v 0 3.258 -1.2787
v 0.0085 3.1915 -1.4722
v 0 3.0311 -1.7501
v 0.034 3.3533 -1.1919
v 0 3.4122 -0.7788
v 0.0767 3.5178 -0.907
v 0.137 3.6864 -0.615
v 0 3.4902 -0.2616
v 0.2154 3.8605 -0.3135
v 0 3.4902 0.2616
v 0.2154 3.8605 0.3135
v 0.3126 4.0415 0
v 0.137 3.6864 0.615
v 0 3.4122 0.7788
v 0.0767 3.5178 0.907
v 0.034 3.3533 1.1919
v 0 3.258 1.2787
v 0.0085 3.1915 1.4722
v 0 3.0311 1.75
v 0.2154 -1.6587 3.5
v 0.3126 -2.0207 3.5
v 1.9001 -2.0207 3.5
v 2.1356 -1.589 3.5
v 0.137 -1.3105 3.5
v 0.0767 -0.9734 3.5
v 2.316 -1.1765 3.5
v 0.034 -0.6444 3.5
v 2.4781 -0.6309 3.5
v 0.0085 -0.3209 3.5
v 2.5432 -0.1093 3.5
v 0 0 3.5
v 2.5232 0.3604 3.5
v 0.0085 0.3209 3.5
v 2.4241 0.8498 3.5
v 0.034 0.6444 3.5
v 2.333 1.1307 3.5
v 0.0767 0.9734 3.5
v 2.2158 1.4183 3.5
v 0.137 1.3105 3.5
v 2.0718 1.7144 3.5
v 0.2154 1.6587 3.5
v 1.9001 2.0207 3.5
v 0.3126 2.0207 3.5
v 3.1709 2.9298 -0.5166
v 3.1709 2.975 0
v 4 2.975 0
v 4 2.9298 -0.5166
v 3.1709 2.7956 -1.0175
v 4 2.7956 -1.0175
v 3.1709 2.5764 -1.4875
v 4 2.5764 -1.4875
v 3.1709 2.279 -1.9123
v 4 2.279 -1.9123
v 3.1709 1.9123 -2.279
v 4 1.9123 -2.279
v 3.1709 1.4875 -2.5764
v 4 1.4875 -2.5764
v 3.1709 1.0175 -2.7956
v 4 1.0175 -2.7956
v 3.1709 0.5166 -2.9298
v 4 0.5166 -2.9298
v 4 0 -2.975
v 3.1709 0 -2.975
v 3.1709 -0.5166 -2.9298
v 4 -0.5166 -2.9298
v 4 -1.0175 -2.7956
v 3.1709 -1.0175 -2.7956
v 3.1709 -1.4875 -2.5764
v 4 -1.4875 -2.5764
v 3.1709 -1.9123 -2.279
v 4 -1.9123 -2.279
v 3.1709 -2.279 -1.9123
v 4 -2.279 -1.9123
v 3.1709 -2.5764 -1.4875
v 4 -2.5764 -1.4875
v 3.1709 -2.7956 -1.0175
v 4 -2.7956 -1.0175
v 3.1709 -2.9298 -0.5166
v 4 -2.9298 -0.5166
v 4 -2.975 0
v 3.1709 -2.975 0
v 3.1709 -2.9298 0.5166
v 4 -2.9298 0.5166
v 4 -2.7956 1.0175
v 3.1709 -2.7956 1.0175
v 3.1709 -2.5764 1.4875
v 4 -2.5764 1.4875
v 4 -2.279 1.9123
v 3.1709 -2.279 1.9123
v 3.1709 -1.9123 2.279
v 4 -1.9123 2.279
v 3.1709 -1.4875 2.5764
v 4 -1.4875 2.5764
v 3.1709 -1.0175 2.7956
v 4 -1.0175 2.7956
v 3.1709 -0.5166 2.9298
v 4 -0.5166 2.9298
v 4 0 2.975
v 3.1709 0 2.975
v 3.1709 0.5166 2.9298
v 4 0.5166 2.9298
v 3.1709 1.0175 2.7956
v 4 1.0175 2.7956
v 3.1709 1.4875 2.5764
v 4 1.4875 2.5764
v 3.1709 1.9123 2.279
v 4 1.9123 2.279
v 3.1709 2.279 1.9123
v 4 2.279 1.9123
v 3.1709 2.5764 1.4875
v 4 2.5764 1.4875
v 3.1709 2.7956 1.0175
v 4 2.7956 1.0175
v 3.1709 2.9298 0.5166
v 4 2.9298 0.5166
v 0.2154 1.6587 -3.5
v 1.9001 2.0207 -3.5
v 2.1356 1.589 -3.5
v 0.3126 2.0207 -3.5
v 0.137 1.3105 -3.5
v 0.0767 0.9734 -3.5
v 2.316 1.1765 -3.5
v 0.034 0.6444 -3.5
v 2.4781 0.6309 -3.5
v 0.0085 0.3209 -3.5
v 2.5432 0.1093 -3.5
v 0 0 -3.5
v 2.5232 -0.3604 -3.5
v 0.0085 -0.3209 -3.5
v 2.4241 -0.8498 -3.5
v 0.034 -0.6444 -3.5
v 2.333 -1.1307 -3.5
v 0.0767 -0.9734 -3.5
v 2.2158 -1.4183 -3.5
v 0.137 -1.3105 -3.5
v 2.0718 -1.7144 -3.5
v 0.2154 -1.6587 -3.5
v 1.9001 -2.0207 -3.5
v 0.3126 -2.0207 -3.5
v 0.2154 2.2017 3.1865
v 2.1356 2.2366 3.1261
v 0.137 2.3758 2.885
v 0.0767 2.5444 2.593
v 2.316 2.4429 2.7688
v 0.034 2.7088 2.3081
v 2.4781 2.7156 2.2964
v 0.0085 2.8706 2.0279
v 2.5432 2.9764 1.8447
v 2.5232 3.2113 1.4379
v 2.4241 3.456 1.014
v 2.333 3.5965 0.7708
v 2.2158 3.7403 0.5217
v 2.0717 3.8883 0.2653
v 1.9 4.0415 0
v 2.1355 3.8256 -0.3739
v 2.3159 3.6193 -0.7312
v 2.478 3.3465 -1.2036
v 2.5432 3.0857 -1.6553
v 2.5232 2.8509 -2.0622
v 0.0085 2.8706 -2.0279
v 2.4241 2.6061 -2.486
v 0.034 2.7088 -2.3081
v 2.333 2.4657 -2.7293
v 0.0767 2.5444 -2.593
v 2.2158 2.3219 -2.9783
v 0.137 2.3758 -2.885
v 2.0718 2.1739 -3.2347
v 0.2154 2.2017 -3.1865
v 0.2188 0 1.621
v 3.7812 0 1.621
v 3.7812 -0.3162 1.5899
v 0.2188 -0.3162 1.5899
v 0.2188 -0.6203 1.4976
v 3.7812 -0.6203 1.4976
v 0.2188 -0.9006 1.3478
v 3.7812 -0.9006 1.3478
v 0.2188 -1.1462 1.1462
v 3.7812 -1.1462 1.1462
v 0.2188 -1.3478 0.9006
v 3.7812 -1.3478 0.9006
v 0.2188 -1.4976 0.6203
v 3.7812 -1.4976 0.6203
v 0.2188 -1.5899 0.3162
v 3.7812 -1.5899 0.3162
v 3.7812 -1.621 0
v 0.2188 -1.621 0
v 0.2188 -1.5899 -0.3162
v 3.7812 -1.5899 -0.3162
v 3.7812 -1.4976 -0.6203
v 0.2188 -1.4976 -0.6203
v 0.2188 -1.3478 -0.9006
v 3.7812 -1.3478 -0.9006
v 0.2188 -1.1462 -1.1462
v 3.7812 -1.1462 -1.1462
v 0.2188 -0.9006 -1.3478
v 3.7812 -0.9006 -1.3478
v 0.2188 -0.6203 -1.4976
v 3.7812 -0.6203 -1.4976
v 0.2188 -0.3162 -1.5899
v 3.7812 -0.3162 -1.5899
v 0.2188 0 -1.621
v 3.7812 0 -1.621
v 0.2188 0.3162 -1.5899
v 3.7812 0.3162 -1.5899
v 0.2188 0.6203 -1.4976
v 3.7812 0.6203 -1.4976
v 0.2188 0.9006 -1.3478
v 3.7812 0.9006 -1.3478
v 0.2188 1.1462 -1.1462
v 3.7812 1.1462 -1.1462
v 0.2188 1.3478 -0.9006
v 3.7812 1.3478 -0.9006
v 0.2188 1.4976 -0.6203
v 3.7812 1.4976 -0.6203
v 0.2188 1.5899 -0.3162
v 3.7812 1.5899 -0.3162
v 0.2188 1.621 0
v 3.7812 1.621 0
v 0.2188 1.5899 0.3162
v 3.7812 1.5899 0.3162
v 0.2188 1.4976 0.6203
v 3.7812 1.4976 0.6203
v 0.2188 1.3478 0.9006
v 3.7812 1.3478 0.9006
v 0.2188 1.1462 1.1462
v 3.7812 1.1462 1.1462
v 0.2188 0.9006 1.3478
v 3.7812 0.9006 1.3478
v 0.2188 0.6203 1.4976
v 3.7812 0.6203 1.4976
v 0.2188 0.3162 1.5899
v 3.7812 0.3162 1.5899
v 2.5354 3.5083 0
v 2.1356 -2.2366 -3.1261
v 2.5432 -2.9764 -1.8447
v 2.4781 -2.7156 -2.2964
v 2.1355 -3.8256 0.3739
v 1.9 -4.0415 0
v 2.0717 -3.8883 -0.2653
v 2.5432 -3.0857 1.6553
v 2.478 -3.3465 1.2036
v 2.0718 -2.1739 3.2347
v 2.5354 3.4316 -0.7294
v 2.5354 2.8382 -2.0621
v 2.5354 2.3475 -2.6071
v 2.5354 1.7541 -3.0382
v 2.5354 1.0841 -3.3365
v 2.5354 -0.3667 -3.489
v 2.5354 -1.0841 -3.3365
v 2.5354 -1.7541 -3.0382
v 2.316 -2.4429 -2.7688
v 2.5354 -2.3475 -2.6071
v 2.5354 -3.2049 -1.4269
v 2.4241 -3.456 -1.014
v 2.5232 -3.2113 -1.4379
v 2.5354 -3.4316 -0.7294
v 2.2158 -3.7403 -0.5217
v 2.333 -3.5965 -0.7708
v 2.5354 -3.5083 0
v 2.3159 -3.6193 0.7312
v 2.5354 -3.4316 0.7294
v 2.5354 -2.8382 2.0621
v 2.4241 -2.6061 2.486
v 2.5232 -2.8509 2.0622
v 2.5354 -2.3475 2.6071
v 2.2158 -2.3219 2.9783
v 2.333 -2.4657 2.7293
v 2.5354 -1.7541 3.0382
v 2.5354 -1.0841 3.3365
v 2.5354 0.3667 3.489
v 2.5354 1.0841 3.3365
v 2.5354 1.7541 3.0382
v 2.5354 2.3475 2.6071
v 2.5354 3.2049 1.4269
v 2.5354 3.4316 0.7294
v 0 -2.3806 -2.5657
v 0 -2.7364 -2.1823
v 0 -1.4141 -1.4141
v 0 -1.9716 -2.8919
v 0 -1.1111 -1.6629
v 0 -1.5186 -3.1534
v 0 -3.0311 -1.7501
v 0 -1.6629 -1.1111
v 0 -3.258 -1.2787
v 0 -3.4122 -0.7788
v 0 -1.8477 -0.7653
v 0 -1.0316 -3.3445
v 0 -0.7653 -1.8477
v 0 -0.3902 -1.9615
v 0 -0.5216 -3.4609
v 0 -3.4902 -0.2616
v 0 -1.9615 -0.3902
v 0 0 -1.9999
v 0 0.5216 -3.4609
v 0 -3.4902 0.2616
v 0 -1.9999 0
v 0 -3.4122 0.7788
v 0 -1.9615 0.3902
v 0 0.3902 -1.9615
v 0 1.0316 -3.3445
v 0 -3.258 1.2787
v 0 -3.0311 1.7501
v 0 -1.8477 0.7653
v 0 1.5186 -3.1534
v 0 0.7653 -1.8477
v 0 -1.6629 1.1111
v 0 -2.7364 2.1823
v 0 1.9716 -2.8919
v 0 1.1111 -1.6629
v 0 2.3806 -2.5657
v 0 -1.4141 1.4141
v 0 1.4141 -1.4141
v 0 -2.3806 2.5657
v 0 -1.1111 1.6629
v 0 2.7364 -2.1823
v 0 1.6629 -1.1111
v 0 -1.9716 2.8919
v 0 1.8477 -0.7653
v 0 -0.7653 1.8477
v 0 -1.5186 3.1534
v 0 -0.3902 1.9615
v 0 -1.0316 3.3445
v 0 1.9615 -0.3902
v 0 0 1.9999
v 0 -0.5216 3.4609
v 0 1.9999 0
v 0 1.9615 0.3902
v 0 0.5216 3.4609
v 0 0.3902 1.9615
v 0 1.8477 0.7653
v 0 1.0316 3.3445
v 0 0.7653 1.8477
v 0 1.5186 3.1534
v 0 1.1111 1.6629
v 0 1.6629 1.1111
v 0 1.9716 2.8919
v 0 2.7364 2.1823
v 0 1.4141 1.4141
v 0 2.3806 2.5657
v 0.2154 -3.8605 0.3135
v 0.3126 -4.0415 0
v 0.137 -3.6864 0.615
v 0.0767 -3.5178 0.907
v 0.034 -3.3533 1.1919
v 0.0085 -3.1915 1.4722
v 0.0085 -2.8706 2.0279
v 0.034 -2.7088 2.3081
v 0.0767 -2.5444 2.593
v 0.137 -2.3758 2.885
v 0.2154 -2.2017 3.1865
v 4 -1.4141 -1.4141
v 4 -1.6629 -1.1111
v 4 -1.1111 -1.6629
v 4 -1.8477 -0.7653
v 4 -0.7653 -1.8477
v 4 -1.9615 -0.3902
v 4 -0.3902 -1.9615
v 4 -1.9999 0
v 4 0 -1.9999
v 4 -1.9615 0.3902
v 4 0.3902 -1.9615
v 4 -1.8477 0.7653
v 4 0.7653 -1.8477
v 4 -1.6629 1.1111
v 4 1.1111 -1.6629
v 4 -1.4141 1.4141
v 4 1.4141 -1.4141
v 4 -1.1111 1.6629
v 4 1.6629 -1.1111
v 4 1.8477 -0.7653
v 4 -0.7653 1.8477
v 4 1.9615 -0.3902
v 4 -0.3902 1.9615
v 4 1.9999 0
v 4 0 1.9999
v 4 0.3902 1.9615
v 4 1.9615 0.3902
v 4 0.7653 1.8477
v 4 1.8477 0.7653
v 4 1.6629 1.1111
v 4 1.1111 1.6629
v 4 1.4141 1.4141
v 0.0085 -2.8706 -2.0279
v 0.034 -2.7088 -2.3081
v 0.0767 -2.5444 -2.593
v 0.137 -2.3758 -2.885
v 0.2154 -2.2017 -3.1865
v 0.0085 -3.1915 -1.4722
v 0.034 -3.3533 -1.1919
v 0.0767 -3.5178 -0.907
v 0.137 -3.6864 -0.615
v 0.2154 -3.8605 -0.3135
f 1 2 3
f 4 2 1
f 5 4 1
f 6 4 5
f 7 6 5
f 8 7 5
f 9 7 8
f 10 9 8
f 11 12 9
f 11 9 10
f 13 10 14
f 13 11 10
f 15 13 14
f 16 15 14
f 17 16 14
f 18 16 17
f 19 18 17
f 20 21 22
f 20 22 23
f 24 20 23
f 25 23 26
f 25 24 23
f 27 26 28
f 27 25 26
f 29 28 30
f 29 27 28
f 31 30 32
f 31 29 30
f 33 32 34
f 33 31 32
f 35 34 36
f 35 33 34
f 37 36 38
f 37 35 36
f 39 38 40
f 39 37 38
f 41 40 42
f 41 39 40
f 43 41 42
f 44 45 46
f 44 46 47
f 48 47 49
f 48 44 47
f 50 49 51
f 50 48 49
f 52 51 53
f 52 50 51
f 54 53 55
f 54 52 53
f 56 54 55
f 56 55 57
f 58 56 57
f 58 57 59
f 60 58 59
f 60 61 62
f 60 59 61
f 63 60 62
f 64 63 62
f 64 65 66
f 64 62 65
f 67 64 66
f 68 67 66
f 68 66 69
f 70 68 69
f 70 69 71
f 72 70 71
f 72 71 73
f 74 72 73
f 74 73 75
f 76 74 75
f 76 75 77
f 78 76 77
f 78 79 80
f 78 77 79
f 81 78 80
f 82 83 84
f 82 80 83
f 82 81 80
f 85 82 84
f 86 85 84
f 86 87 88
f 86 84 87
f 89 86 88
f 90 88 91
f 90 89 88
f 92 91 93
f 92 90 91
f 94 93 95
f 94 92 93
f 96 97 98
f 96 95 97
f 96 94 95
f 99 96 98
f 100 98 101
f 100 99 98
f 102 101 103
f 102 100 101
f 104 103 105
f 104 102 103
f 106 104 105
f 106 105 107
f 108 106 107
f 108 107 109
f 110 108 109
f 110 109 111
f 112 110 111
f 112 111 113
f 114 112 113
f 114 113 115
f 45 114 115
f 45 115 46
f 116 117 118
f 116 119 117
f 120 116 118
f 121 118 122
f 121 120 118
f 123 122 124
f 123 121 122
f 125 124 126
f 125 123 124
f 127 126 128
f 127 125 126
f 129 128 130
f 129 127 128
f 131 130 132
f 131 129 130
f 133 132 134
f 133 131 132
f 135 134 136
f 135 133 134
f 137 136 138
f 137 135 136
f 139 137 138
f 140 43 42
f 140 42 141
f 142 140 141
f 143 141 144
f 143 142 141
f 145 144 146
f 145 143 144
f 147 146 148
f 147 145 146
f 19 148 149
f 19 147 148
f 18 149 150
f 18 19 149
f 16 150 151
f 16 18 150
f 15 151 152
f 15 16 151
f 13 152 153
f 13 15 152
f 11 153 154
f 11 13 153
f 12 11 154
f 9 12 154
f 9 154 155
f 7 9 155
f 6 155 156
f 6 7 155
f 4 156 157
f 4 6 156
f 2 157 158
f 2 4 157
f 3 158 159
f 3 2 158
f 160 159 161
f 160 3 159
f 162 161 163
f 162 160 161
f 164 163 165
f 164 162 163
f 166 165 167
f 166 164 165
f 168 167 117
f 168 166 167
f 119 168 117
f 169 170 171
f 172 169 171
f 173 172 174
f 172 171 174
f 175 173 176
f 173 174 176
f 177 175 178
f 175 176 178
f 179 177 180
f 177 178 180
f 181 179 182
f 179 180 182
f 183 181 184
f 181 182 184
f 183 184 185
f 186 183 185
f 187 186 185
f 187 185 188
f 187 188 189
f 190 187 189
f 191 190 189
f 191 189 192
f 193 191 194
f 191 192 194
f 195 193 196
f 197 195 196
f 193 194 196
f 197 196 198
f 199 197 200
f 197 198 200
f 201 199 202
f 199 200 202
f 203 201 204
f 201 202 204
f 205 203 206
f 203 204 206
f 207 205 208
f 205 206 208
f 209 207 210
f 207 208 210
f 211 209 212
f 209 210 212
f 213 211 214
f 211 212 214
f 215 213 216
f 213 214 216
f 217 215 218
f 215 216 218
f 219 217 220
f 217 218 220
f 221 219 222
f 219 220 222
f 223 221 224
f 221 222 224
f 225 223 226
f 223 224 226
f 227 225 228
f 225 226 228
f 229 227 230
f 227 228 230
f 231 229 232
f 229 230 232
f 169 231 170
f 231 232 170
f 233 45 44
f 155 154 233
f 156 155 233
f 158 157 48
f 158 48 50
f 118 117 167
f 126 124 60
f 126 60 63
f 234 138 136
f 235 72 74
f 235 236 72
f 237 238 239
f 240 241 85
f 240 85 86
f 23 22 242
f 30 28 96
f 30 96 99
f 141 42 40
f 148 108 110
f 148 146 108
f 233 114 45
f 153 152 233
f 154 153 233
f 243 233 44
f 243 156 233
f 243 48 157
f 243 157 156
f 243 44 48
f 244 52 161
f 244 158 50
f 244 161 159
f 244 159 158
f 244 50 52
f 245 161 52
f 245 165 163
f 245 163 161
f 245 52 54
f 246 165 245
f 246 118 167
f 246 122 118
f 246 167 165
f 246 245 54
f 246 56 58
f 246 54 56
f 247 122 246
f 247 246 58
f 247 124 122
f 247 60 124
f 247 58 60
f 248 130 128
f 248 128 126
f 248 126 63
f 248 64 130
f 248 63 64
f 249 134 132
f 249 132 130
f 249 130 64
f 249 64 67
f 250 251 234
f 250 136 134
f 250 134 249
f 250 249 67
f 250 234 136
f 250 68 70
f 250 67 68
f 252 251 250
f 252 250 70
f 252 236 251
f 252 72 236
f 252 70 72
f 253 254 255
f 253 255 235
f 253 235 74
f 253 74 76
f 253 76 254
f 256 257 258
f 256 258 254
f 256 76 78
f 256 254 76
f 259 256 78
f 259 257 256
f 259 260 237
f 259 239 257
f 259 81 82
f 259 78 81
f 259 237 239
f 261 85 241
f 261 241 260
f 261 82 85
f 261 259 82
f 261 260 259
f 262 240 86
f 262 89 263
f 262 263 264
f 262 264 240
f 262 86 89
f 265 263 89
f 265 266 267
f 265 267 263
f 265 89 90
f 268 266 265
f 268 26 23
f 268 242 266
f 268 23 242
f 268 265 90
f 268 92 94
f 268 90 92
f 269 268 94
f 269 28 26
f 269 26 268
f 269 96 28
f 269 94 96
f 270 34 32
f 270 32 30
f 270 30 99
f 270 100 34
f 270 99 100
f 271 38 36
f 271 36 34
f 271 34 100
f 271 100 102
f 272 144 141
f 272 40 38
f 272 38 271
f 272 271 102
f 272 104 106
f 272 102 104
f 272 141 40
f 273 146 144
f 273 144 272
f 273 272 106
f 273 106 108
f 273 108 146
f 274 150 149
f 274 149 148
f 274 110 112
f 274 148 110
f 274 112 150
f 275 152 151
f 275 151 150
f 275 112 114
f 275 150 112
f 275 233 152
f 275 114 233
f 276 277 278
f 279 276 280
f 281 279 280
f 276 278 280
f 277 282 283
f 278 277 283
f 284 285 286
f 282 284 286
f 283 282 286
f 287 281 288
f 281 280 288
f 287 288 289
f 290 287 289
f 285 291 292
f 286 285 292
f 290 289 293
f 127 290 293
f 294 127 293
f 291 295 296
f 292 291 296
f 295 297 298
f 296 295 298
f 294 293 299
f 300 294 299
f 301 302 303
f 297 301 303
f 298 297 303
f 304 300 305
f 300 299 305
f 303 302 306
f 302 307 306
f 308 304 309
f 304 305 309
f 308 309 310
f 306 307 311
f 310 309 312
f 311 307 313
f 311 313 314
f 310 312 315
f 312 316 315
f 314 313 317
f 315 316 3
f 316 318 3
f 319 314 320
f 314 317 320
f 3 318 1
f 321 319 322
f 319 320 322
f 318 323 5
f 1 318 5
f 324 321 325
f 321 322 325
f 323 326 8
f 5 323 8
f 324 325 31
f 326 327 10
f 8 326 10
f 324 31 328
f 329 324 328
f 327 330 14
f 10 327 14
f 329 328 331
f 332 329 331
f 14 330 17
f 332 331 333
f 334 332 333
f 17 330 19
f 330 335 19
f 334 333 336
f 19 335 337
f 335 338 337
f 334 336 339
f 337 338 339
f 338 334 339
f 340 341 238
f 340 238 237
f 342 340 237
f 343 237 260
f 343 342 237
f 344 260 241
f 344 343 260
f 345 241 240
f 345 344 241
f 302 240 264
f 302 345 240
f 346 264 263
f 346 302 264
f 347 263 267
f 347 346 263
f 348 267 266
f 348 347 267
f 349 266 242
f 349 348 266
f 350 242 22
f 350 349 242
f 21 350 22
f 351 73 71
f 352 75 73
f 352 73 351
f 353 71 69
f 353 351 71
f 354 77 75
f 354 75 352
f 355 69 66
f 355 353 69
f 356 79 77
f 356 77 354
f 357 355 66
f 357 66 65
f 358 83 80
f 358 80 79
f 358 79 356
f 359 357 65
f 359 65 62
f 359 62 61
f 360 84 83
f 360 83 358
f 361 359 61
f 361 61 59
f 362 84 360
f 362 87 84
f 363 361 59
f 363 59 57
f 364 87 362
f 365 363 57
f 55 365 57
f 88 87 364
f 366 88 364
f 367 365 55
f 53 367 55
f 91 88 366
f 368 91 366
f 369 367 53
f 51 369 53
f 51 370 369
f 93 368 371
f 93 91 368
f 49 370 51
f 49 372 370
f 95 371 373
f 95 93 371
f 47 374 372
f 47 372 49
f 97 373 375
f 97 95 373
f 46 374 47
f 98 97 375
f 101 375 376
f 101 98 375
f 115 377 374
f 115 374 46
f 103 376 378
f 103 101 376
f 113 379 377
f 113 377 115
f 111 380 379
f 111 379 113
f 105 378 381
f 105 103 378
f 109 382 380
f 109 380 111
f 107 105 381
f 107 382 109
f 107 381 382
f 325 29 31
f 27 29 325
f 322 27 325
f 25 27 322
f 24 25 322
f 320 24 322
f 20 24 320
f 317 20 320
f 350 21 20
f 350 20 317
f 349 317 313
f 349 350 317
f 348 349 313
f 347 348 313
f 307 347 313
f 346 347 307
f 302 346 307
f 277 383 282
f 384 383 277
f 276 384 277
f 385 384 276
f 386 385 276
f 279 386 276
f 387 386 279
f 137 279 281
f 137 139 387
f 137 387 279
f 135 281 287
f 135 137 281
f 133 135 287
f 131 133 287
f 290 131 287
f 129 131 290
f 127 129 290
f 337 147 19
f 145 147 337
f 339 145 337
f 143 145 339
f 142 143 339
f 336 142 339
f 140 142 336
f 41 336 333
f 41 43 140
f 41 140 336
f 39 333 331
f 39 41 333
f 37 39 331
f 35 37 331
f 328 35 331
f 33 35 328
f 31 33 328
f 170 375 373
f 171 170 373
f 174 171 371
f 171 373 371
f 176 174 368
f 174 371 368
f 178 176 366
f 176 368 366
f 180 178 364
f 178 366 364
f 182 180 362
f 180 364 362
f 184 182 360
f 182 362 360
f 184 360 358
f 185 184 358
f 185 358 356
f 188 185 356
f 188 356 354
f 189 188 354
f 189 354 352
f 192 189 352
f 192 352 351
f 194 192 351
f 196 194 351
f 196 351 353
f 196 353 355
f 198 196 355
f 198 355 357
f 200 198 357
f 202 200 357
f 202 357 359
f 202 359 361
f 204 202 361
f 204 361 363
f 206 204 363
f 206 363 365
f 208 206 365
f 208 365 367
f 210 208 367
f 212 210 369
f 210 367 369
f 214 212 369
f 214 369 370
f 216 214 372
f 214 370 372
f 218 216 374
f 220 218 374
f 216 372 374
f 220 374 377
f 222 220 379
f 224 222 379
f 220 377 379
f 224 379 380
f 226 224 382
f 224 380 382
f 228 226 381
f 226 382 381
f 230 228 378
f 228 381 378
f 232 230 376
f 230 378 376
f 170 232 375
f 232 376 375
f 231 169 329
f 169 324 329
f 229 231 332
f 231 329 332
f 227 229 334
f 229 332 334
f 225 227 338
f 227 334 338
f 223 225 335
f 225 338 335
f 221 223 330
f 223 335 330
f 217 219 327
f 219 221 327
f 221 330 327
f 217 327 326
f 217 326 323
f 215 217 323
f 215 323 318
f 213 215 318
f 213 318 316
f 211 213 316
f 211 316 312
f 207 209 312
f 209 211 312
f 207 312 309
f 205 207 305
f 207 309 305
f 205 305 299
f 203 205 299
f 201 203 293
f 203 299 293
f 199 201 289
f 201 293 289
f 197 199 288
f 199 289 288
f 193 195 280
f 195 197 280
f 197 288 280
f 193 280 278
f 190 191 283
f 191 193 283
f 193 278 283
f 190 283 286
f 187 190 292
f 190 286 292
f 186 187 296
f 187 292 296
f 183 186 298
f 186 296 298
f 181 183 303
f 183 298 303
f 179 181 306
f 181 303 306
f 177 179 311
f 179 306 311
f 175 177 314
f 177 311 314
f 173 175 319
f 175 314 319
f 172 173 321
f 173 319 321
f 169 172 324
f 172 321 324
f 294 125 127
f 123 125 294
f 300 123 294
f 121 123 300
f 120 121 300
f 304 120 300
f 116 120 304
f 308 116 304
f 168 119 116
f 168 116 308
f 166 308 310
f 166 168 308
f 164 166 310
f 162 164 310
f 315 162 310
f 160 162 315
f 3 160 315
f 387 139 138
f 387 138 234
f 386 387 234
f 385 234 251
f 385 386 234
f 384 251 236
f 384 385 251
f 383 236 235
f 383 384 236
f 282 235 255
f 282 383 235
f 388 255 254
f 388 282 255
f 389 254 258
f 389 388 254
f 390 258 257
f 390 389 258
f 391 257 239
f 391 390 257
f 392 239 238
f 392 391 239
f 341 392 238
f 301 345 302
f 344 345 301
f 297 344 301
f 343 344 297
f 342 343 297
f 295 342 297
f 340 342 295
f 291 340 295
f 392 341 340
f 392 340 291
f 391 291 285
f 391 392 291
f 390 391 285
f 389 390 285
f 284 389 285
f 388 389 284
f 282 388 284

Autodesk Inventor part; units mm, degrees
ref_plane "YZ Plane" through (0, 0, 0) normal (1, 0, 0) x (0, 1, 0)
ref_plane "XZ Plane" through (0, 0, 0) normal (0, 1, 0) x (-1, 0, 0)
sketch "Sketch1" plane through (0, 0, 0) normal (1, 0, 0) x (0, 1, 0)
  line L0 (-4.0415, 0) -> (-2.0207, 3.5)
  line L1 (-2.0207, 3.5) -> (2.0207, 3.5)
  line L2 (2.0207, 3.5) -> (4.0415, 0)
  line L3 (4.0415, 0) -> (2.0207, -3.5)
  line L4 (2.0207, -3.5) -> (-2.0207, -3.5)
  line L5 (-2.0207, -3.5) -> (-4.0415, 0)
  point P0 (0, 0)
  point P1 (0, 0)
  dimension "d0" = 8.0829
extrude "Body" add sketch "Sketch1" along normal blind 4
sketch "Sketch2" plane through (0, 0, 0) normal (-1, 0, 0) x (0, 0, 1)
  line L0 (0, -5.658) -> (0, 5.658) projected
  line L1 (-4.9, 0) -> (4.9, 0) projected
  point P0 (0, 0)
hole "Thread" at (0, 0, 0) direction (1, 0, 0) diameter 3.242 end through all thread size "M4x0.7" class "6H" standard "ANSI Metric M Profile"
chamfer "Chamfer1" distance 0.3789 angle 30 1 edges at (0, 0, -1.621) measured on face at (0, -2.4654, -1.4736)
chamfer "Chamfer2" distance 0.3789 angle 30 1 edges at (4, 0, -1.621) measured on face at (4, -2.4654, -1.4736)
sketch "Sketch3" plane through (0, 0, 0) normal (0, 0, 1) x (1, 0, 0)
  line L0 (0, 2.0207) -> (0, 4.0415) projected
  line L1 (0, 4.0415) -> (4, 4.0415) projected
  line L2 (4, 2.0207) -> (4, 4.0415) projected
  line L3 (-0.8, 0) -> (4.8, 0) projected
  line L4 (0.3126, 4.0415) -> (0, 3.5)
  line L5 (4, 2.975) -> (3.1709, 2.975)
  line L6 (3.1709, 2.975) -> (1.9, 4.0415)
  dimension "d3" = 30
  dimension "d5" = 7
  dimension "d6" = 5.95
  dimension "d8" = 50
  dimension "d9" = 1.9
revolve "Chamfer3" cut sketch "Sketch3" angle 360 about axis through (-10, 0, 0) along (1, 0, 0)
ref_plane "Work Plane1" through (11.4164, 0, 0) normal (0, 0, 1) x (-1, 0, 0)
equation "\"d0\" = 1.1547 * SW"
equation "\"d1\" = KOH"
equation "\"d3\" = ANG1"
equation "\"d5\" = SW0"
equation "\"d6\" = SW1"
equation "\"d8\" = ANG2"
equation "\"d9\" = KOH1"
equation "\"d10\" = -0.5 * GD1 + 0.5 * NND"
equation "\"d39\" = -0.5 * GD1 + 0.5 * NND"
equation "\"d12\" = -0.5 * GD1 + 0.5 * NND"
equation "\"d40\" = -0.5 * GD1 + 0.5 * NND"
equation "\"ANG1\" = 30deg"
equation "\"ANG2\" = 50deg"
equation "\"NND\" = 4"
equation "\"KOH\" = 4"
equation "\"SW\" = 7"
equation "\"SW0\" = SW"
equation "\"SW1\" = 0.85 * SW"
equation "\"KOH1\" = 1.9"
equation "\"GUL\" = 0.541266 * PTC"
equation "\"THREADDIA\" = 4"
equation "\"TOA\" = 30deg"
equation "\"PTC\" = 0.7"
equation "\"E0\" = 1.155 * SW"
equation "\"GAL\" = 0.541266 * PTC"
equation "\"GD1\" = 3.242228"
properties part number "ANSI B18.16.3M - Property Class 9 - Metric M4 x 0.7 Metal Type" material "Steel, Mild"
